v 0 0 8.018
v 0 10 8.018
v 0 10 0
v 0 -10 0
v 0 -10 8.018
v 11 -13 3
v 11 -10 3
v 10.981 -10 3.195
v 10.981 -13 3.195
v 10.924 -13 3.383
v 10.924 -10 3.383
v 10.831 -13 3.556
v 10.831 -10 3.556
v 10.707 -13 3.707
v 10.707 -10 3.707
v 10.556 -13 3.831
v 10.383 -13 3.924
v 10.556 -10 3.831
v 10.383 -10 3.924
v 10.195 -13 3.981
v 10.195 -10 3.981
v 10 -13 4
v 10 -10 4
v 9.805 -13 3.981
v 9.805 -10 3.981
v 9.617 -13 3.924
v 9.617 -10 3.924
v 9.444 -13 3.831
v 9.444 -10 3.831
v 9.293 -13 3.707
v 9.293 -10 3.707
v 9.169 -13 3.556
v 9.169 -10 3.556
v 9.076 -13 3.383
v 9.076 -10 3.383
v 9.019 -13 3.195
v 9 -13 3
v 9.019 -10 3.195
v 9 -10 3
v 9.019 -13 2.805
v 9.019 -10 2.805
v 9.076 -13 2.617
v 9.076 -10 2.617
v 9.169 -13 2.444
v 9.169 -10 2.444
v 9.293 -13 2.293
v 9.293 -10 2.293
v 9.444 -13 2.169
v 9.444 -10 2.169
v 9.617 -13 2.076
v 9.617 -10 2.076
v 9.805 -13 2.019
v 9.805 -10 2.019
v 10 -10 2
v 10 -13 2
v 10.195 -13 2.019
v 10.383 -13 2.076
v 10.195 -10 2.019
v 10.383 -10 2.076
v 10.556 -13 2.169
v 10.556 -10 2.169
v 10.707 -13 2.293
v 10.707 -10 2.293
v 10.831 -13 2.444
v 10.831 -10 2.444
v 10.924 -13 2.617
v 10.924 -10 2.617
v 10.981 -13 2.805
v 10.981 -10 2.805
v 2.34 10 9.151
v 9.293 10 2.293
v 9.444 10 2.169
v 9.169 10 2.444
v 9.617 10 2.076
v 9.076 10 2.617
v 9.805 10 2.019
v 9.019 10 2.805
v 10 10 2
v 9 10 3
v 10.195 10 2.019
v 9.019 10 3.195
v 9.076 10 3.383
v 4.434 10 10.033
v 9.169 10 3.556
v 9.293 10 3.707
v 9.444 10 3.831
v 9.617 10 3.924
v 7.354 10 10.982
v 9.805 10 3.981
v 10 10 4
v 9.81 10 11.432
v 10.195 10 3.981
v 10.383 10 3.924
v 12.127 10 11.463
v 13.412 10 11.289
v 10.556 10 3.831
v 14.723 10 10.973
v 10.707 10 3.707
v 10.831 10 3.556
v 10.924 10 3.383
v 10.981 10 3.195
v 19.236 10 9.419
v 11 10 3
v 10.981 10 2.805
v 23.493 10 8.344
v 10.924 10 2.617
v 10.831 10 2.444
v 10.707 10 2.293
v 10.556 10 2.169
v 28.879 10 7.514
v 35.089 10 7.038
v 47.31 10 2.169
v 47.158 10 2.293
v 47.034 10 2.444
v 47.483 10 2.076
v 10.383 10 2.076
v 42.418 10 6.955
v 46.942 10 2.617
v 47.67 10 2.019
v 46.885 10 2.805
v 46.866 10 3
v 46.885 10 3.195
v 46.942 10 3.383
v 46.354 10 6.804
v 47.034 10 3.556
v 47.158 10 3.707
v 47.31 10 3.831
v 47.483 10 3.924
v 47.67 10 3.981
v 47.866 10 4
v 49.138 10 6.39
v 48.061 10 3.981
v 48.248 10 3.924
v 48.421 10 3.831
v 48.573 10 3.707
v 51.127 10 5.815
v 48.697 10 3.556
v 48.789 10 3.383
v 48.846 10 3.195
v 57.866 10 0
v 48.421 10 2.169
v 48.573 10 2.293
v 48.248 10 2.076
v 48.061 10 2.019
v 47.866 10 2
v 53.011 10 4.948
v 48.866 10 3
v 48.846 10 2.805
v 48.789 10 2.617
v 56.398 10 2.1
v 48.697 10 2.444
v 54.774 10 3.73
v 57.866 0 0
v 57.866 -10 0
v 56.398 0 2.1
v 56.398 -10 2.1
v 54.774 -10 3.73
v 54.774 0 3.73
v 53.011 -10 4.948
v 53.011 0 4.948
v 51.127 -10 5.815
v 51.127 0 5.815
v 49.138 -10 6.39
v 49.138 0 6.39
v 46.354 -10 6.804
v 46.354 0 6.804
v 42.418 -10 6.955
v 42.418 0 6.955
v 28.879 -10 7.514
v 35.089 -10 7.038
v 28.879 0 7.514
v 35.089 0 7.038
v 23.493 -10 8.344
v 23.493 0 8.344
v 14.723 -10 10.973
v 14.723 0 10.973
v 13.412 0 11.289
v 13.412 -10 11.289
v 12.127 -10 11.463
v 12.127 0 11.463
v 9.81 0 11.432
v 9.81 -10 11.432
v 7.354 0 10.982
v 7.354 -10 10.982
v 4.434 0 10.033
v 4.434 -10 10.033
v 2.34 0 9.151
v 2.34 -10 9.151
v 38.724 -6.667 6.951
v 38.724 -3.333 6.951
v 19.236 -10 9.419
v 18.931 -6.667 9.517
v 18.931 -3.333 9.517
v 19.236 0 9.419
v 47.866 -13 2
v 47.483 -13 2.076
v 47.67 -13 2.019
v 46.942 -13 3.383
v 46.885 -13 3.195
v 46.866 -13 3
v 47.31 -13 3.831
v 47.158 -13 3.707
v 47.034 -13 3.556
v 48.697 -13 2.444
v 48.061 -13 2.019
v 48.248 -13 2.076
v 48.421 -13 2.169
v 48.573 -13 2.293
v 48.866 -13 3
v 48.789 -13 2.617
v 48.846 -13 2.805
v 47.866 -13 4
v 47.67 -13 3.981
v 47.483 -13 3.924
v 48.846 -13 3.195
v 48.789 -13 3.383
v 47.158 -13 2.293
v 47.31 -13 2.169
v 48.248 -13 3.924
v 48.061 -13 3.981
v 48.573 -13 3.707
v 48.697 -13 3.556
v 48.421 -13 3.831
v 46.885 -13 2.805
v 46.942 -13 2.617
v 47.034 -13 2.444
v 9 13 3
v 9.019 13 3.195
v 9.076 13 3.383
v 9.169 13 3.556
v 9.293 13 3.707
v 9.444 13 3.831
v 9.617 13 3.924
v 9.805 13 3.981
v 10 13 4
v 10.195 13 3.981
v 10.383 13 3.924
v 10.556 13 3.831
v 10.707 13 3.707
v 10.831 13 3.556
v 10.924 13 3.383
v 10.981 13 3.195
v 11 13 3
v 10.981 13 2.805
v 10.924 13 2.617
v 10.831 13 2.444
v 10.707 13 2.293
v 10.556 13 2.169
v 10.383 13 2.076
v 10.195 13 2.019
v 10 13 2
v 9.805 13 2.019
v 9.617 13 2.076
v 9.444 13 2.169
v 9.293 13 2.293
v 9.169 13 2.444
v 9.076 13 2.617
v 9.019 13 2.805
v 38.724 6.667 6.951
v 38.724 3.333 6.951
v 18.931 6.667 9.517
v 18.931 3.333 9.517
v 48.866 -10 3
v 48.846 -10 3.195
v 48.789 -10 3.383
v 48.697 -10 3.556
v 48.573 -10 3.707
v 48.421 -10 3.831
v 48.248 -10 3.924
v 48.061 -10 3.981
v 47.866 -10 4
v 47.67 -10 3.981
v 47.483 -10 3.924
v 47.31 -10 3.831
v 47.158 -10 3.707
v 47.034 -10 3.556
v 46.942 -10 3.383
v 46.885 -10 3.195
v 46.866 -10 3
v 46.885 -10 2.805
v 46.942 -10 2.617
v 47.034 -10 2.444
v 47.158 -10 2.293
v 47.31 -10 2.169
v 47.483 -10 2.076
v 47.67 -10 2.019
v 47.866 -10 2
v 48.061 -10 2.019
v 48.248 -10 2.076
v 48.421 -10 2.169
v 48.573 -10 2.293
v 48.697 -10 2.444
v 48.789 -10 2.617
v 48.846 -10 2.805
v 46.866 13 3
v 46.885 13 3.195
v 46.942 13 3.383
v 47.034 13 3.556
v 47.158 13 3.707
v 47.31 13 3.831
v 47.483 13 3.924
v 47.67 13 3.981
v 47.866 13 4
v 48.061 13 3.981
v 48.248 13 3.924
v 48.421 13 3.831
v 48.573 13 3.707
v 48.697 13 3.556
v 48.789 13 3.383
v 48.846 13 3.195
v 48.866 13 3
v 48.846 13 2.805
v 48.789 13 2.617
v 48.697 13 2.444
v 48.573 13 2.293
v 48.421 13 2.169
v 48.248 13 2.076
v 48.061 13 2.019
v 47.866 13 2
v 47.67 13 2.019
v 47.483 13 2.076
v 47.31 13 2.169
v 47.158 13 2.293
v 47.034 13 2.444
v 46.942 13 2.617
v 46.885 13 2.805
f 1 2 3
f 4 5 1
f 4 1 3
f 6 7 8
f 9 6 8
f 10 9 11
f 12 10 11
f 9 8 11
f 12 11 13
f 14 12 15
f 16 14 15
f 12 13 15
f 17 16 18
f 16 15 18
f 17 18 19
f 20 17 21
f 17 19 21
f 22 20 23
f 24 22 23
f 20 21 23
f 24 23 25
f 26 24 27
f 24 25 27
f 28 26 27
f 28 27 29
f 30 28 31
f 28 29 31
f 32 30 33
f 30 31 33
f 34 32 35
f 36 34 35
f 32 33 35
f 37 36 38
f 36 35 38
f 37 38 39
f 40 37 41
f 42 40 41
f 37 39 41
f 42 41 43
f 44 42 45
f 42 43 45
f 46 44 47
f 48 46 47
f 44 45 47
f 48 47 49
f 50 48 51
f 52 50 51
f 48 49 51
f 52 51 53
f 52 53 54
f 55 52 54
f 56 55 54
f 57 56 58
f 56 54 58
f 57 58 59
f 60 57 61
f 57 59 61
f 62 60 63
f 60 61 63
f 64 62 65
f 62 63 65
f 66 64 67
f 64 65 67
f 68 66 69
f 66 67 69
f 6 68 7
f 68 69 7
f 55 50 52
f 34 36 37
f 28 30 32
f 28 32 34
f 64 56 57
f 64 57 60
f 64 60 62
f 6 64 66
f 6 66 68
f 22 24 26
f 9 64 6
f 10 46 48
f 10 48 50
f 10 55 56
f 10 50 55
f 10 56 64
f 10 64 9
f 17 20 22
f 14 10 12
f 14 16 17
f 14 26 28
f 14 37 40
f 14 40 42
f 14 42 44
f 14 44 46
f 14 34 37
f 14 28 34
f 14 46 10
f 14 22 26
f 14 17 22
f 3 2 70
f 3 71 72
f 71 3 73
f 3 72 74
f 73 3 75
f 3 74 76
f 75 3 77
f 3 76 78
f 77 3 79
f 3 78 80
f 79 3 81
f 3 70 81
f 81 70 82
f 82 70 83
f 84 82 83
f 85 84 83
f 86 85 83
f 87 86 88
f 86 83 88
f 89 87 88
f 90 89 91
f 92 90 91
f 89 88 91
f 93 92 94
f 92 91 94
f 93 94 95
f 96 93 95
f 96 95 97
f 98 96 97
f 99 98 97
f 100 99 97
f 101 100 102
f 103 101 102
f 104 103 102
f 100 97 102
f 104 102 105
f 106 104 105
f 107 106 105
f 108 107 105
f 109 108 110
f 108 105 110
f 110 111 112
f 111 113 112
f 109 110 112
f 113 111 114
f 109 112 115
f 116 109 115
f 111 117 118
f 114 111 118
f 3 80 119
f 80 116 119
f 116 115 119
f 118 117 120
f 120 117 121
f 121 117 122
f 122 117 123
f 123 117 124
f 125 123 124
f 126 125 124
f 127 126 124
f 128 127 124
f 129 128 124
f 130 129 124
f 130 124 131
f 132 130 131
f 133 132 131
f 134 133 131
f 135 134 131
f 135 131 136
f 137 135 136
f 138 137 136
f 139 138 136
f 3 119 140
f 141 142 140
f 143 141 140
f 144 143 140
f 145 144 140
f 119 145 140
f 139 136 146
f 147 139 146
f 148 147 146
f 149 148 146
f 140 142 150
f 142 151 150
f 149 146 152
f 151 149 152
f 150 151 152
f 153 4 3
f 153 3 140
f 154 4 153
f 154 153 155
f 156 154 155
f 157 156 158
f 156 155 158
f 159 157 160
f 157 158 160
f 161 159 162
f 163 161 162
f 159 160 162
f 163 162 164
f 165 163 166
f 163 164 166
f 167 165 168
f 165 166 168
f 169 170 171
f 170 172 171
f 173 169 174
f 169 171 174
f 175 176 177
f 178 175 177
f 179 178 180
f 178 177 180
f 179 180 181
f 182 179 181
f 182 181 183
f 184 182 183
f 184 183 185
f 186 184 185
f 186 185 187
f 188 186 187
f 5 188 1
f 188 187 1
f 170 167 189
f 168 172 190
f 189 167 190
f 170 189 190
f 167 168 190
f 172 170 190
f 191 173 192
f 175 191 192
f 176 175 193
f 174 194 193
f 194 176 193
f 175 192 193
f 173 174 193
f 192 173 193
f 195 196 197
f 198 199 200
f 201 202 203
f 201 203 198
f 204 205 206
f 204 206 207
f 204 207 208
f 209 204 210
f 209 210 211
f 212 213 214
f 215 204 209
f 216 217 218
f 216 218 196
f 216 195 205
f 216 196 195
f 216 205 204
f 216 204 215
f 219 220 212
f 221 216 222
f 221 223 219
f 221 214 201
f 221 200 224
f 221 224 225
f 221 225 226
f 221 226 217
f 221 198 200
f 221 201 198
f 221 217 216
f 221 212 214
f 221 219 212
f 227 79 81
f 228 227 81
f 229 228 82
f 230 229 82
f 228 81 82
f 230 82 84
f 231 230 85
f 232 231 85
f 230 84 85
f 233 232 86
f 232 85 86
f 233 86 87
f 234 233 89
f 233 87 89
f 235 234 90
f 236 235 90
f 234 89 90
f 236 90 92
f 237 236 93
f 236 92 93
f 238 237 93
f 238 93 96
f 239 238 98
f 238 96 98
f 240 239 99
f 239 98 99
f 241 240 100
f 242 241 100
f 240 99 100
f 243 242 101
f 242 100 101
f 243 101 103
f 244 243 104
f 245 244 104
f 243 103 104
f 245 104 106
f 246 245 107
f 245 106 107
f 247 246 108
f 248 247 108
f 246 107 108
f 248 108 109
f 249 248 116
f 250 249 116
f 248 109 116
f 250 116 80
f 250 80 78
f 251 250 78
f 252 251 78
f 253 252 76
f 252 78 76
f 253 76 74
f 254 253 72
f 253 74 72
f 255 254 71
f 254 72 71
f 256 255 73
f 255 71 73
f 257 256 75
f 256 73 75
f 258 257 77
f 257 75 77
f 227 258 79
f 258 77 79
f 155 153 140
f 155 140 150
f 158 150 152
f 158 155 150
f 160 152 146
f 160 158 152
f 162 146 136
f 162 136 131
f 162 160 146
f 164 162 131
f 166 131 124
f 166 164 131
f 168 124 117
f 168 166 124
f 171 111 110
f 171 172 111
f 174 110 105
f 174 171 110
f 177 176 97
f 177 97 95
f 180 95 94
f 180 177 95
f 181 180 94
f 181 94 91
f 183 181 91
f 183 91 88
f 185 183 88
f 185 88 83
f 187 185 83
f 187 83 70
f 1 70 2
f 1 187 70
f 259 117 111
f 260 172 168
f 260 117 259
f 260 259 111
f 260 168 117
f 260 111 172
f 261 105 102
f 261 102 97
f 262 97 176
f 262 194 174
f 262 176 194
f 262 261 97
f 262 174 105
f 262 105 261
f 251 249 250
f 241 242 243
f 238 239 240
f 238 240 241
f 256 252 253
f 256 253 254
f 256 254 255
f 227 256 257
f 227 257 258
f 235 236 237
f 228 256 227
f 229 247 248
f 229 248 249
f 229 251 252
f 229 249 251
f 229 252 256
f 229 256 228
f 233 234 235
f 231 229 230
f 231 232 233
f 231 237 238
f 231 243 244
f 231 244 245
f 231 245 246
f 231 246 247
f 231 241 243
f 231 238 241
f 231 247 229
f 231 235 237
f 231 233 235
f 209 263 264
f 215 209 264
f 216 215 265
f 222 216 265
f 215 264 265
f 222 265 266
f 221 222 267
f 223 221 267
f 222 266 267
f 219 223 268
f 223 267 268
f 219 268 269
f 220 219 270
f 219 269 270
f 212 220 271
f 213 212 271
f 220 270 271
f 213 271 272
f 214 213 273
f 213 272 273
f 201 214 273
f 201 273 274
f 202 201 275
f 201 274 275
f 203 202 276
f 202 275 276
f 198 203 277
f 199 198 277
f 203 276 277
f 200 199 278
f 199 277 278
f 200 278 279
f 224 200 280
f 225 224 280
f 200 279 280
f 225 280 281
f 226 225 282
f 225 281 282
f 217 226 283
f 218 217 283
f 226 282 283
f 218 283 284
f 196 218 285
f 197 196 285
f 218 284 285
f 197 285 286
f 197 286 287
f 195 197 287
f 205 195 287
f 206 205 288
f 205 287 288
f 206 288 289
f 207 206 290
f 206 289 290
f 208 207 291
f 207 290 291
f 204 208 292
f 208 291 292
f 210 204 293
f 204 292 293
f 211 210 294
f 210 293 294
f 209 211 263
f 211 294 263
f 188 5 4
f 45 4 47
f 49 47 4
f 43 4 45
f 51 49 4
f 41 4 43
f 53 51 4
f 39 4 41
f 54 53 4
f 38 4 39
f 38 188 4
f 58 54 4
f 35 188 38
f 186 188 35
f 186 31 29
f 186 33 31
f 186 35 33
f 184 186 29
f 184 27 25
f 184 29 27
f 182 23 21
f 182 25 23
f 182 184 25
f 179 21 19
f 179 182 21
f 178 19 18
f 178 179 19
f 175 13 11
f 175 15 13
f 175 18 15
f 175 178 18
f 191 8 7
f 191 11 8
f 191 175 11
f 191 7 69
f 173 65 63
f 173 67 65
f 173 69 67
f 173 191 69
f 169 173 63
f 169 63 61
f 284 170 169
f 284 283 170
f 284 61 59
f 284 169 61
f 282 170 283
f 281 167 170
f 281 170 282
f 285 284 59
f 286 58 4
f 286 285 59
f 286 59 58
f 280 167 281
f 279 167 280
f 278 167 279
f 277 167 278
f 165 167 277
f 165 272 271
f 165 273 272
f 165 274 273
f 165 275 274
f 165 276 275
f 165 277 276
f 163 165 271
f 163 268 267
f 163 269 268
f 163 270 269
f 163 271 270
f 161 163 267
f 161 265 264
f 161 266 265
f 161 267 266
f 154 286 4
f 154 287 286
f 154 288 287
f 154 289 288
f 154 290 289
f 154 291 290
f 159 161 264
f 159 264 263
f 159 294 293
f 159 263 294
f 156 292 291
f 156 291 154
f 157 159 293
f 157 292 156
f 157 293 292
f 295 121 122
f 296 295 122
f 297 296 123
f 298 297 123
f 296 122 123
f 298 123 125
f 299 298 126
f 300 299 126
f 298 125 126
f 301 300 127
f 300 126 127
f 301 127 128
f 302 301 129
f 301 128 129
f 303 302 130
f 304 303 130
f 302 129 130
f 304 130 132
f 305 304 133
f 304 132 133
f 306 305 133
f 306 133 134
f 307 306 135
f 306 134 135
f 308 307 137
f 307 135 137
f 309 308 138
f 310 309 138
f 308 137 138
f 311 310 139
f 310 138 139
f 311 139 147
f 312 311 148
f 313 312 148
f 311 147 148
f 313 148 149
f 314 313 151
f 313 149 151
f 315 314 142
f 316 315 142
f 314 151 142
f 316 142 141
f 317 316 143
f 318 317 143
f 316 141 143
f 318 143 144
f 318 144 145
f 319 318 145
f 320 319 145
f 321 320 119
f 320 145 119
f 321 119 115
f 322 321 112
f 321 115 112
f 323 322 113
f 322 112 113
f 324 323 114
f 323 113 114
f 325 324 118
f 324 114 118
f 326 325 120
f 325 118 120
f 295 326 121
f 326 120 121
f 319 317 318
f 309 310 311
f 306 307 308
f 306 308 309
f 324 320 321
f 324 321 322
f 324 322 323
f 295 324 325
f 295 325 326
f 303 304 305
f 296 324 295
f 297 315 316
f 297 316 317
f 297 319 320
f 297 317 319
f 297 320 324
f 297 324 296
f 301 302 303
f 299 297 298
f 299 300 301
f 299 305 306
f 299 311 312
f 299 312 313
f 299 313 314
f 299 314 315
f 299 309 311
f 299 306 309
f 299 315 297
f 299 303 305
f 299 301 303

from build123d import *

# Parameters (mm, degrees)
F1_DEPTH      = 10
F1_DEPTH_BACK = 10
F2_R          = 1
F3_DEPTH      = 3
F4_R          = 1
F5_DEPTH      = 3


with BuildPart() as f1:
    # F0 (on Front) → F1 (new body, two sides)
    with BuildSketch(Plane.XZ) as f1_sk:
        with BuildLine():
            Line((0, 8.0180410296), (0, 0))
            Line((0, 0), (57.8655228019, 0))
            add(Edge.make_bspline(
                [(57.8655228019, 0), (53.3525021995, 7.678503938), (38.8737749231, 6.1488013594), (16.9168304935, 8.6407277286), (10.9544817757, 13.6306187476), (0, 8.0180410296)],
                knots=[0, 0, 0, 0, 0.3383348981, 0.6732781108, 1, 1, 1, 1], degree=3))
        make_face()
    extrude(amount=F1_DEPTH)
    extrude(f1_sk.sketch, amount=-F1_DEPTH_BACK)

    # F2 (on face) → F3 (join)
    with BuildSketch(Plane.XZ.offset(10)):
        with Locations((10, 3)):
            Circle(F2_R)
        with Locations((47.8655228019, 3)):
            Circle(F2_R)
    extrude(amount=F3_DEPTH)

    # F4 (on face) → F5 (join)
    with BuildSketch(Plane(origin=(0, 10, 0), x_dir=(-1, 0, 0), z_dir=(0, 1, 0))):
        with Locations((-47.8655228019, 3)):
            Circle(F4_R)
        with Locations((-10, 3)):
            Circle(F4_R)
    extrude(amount=F5_DEPTH)


solid = f1.part
